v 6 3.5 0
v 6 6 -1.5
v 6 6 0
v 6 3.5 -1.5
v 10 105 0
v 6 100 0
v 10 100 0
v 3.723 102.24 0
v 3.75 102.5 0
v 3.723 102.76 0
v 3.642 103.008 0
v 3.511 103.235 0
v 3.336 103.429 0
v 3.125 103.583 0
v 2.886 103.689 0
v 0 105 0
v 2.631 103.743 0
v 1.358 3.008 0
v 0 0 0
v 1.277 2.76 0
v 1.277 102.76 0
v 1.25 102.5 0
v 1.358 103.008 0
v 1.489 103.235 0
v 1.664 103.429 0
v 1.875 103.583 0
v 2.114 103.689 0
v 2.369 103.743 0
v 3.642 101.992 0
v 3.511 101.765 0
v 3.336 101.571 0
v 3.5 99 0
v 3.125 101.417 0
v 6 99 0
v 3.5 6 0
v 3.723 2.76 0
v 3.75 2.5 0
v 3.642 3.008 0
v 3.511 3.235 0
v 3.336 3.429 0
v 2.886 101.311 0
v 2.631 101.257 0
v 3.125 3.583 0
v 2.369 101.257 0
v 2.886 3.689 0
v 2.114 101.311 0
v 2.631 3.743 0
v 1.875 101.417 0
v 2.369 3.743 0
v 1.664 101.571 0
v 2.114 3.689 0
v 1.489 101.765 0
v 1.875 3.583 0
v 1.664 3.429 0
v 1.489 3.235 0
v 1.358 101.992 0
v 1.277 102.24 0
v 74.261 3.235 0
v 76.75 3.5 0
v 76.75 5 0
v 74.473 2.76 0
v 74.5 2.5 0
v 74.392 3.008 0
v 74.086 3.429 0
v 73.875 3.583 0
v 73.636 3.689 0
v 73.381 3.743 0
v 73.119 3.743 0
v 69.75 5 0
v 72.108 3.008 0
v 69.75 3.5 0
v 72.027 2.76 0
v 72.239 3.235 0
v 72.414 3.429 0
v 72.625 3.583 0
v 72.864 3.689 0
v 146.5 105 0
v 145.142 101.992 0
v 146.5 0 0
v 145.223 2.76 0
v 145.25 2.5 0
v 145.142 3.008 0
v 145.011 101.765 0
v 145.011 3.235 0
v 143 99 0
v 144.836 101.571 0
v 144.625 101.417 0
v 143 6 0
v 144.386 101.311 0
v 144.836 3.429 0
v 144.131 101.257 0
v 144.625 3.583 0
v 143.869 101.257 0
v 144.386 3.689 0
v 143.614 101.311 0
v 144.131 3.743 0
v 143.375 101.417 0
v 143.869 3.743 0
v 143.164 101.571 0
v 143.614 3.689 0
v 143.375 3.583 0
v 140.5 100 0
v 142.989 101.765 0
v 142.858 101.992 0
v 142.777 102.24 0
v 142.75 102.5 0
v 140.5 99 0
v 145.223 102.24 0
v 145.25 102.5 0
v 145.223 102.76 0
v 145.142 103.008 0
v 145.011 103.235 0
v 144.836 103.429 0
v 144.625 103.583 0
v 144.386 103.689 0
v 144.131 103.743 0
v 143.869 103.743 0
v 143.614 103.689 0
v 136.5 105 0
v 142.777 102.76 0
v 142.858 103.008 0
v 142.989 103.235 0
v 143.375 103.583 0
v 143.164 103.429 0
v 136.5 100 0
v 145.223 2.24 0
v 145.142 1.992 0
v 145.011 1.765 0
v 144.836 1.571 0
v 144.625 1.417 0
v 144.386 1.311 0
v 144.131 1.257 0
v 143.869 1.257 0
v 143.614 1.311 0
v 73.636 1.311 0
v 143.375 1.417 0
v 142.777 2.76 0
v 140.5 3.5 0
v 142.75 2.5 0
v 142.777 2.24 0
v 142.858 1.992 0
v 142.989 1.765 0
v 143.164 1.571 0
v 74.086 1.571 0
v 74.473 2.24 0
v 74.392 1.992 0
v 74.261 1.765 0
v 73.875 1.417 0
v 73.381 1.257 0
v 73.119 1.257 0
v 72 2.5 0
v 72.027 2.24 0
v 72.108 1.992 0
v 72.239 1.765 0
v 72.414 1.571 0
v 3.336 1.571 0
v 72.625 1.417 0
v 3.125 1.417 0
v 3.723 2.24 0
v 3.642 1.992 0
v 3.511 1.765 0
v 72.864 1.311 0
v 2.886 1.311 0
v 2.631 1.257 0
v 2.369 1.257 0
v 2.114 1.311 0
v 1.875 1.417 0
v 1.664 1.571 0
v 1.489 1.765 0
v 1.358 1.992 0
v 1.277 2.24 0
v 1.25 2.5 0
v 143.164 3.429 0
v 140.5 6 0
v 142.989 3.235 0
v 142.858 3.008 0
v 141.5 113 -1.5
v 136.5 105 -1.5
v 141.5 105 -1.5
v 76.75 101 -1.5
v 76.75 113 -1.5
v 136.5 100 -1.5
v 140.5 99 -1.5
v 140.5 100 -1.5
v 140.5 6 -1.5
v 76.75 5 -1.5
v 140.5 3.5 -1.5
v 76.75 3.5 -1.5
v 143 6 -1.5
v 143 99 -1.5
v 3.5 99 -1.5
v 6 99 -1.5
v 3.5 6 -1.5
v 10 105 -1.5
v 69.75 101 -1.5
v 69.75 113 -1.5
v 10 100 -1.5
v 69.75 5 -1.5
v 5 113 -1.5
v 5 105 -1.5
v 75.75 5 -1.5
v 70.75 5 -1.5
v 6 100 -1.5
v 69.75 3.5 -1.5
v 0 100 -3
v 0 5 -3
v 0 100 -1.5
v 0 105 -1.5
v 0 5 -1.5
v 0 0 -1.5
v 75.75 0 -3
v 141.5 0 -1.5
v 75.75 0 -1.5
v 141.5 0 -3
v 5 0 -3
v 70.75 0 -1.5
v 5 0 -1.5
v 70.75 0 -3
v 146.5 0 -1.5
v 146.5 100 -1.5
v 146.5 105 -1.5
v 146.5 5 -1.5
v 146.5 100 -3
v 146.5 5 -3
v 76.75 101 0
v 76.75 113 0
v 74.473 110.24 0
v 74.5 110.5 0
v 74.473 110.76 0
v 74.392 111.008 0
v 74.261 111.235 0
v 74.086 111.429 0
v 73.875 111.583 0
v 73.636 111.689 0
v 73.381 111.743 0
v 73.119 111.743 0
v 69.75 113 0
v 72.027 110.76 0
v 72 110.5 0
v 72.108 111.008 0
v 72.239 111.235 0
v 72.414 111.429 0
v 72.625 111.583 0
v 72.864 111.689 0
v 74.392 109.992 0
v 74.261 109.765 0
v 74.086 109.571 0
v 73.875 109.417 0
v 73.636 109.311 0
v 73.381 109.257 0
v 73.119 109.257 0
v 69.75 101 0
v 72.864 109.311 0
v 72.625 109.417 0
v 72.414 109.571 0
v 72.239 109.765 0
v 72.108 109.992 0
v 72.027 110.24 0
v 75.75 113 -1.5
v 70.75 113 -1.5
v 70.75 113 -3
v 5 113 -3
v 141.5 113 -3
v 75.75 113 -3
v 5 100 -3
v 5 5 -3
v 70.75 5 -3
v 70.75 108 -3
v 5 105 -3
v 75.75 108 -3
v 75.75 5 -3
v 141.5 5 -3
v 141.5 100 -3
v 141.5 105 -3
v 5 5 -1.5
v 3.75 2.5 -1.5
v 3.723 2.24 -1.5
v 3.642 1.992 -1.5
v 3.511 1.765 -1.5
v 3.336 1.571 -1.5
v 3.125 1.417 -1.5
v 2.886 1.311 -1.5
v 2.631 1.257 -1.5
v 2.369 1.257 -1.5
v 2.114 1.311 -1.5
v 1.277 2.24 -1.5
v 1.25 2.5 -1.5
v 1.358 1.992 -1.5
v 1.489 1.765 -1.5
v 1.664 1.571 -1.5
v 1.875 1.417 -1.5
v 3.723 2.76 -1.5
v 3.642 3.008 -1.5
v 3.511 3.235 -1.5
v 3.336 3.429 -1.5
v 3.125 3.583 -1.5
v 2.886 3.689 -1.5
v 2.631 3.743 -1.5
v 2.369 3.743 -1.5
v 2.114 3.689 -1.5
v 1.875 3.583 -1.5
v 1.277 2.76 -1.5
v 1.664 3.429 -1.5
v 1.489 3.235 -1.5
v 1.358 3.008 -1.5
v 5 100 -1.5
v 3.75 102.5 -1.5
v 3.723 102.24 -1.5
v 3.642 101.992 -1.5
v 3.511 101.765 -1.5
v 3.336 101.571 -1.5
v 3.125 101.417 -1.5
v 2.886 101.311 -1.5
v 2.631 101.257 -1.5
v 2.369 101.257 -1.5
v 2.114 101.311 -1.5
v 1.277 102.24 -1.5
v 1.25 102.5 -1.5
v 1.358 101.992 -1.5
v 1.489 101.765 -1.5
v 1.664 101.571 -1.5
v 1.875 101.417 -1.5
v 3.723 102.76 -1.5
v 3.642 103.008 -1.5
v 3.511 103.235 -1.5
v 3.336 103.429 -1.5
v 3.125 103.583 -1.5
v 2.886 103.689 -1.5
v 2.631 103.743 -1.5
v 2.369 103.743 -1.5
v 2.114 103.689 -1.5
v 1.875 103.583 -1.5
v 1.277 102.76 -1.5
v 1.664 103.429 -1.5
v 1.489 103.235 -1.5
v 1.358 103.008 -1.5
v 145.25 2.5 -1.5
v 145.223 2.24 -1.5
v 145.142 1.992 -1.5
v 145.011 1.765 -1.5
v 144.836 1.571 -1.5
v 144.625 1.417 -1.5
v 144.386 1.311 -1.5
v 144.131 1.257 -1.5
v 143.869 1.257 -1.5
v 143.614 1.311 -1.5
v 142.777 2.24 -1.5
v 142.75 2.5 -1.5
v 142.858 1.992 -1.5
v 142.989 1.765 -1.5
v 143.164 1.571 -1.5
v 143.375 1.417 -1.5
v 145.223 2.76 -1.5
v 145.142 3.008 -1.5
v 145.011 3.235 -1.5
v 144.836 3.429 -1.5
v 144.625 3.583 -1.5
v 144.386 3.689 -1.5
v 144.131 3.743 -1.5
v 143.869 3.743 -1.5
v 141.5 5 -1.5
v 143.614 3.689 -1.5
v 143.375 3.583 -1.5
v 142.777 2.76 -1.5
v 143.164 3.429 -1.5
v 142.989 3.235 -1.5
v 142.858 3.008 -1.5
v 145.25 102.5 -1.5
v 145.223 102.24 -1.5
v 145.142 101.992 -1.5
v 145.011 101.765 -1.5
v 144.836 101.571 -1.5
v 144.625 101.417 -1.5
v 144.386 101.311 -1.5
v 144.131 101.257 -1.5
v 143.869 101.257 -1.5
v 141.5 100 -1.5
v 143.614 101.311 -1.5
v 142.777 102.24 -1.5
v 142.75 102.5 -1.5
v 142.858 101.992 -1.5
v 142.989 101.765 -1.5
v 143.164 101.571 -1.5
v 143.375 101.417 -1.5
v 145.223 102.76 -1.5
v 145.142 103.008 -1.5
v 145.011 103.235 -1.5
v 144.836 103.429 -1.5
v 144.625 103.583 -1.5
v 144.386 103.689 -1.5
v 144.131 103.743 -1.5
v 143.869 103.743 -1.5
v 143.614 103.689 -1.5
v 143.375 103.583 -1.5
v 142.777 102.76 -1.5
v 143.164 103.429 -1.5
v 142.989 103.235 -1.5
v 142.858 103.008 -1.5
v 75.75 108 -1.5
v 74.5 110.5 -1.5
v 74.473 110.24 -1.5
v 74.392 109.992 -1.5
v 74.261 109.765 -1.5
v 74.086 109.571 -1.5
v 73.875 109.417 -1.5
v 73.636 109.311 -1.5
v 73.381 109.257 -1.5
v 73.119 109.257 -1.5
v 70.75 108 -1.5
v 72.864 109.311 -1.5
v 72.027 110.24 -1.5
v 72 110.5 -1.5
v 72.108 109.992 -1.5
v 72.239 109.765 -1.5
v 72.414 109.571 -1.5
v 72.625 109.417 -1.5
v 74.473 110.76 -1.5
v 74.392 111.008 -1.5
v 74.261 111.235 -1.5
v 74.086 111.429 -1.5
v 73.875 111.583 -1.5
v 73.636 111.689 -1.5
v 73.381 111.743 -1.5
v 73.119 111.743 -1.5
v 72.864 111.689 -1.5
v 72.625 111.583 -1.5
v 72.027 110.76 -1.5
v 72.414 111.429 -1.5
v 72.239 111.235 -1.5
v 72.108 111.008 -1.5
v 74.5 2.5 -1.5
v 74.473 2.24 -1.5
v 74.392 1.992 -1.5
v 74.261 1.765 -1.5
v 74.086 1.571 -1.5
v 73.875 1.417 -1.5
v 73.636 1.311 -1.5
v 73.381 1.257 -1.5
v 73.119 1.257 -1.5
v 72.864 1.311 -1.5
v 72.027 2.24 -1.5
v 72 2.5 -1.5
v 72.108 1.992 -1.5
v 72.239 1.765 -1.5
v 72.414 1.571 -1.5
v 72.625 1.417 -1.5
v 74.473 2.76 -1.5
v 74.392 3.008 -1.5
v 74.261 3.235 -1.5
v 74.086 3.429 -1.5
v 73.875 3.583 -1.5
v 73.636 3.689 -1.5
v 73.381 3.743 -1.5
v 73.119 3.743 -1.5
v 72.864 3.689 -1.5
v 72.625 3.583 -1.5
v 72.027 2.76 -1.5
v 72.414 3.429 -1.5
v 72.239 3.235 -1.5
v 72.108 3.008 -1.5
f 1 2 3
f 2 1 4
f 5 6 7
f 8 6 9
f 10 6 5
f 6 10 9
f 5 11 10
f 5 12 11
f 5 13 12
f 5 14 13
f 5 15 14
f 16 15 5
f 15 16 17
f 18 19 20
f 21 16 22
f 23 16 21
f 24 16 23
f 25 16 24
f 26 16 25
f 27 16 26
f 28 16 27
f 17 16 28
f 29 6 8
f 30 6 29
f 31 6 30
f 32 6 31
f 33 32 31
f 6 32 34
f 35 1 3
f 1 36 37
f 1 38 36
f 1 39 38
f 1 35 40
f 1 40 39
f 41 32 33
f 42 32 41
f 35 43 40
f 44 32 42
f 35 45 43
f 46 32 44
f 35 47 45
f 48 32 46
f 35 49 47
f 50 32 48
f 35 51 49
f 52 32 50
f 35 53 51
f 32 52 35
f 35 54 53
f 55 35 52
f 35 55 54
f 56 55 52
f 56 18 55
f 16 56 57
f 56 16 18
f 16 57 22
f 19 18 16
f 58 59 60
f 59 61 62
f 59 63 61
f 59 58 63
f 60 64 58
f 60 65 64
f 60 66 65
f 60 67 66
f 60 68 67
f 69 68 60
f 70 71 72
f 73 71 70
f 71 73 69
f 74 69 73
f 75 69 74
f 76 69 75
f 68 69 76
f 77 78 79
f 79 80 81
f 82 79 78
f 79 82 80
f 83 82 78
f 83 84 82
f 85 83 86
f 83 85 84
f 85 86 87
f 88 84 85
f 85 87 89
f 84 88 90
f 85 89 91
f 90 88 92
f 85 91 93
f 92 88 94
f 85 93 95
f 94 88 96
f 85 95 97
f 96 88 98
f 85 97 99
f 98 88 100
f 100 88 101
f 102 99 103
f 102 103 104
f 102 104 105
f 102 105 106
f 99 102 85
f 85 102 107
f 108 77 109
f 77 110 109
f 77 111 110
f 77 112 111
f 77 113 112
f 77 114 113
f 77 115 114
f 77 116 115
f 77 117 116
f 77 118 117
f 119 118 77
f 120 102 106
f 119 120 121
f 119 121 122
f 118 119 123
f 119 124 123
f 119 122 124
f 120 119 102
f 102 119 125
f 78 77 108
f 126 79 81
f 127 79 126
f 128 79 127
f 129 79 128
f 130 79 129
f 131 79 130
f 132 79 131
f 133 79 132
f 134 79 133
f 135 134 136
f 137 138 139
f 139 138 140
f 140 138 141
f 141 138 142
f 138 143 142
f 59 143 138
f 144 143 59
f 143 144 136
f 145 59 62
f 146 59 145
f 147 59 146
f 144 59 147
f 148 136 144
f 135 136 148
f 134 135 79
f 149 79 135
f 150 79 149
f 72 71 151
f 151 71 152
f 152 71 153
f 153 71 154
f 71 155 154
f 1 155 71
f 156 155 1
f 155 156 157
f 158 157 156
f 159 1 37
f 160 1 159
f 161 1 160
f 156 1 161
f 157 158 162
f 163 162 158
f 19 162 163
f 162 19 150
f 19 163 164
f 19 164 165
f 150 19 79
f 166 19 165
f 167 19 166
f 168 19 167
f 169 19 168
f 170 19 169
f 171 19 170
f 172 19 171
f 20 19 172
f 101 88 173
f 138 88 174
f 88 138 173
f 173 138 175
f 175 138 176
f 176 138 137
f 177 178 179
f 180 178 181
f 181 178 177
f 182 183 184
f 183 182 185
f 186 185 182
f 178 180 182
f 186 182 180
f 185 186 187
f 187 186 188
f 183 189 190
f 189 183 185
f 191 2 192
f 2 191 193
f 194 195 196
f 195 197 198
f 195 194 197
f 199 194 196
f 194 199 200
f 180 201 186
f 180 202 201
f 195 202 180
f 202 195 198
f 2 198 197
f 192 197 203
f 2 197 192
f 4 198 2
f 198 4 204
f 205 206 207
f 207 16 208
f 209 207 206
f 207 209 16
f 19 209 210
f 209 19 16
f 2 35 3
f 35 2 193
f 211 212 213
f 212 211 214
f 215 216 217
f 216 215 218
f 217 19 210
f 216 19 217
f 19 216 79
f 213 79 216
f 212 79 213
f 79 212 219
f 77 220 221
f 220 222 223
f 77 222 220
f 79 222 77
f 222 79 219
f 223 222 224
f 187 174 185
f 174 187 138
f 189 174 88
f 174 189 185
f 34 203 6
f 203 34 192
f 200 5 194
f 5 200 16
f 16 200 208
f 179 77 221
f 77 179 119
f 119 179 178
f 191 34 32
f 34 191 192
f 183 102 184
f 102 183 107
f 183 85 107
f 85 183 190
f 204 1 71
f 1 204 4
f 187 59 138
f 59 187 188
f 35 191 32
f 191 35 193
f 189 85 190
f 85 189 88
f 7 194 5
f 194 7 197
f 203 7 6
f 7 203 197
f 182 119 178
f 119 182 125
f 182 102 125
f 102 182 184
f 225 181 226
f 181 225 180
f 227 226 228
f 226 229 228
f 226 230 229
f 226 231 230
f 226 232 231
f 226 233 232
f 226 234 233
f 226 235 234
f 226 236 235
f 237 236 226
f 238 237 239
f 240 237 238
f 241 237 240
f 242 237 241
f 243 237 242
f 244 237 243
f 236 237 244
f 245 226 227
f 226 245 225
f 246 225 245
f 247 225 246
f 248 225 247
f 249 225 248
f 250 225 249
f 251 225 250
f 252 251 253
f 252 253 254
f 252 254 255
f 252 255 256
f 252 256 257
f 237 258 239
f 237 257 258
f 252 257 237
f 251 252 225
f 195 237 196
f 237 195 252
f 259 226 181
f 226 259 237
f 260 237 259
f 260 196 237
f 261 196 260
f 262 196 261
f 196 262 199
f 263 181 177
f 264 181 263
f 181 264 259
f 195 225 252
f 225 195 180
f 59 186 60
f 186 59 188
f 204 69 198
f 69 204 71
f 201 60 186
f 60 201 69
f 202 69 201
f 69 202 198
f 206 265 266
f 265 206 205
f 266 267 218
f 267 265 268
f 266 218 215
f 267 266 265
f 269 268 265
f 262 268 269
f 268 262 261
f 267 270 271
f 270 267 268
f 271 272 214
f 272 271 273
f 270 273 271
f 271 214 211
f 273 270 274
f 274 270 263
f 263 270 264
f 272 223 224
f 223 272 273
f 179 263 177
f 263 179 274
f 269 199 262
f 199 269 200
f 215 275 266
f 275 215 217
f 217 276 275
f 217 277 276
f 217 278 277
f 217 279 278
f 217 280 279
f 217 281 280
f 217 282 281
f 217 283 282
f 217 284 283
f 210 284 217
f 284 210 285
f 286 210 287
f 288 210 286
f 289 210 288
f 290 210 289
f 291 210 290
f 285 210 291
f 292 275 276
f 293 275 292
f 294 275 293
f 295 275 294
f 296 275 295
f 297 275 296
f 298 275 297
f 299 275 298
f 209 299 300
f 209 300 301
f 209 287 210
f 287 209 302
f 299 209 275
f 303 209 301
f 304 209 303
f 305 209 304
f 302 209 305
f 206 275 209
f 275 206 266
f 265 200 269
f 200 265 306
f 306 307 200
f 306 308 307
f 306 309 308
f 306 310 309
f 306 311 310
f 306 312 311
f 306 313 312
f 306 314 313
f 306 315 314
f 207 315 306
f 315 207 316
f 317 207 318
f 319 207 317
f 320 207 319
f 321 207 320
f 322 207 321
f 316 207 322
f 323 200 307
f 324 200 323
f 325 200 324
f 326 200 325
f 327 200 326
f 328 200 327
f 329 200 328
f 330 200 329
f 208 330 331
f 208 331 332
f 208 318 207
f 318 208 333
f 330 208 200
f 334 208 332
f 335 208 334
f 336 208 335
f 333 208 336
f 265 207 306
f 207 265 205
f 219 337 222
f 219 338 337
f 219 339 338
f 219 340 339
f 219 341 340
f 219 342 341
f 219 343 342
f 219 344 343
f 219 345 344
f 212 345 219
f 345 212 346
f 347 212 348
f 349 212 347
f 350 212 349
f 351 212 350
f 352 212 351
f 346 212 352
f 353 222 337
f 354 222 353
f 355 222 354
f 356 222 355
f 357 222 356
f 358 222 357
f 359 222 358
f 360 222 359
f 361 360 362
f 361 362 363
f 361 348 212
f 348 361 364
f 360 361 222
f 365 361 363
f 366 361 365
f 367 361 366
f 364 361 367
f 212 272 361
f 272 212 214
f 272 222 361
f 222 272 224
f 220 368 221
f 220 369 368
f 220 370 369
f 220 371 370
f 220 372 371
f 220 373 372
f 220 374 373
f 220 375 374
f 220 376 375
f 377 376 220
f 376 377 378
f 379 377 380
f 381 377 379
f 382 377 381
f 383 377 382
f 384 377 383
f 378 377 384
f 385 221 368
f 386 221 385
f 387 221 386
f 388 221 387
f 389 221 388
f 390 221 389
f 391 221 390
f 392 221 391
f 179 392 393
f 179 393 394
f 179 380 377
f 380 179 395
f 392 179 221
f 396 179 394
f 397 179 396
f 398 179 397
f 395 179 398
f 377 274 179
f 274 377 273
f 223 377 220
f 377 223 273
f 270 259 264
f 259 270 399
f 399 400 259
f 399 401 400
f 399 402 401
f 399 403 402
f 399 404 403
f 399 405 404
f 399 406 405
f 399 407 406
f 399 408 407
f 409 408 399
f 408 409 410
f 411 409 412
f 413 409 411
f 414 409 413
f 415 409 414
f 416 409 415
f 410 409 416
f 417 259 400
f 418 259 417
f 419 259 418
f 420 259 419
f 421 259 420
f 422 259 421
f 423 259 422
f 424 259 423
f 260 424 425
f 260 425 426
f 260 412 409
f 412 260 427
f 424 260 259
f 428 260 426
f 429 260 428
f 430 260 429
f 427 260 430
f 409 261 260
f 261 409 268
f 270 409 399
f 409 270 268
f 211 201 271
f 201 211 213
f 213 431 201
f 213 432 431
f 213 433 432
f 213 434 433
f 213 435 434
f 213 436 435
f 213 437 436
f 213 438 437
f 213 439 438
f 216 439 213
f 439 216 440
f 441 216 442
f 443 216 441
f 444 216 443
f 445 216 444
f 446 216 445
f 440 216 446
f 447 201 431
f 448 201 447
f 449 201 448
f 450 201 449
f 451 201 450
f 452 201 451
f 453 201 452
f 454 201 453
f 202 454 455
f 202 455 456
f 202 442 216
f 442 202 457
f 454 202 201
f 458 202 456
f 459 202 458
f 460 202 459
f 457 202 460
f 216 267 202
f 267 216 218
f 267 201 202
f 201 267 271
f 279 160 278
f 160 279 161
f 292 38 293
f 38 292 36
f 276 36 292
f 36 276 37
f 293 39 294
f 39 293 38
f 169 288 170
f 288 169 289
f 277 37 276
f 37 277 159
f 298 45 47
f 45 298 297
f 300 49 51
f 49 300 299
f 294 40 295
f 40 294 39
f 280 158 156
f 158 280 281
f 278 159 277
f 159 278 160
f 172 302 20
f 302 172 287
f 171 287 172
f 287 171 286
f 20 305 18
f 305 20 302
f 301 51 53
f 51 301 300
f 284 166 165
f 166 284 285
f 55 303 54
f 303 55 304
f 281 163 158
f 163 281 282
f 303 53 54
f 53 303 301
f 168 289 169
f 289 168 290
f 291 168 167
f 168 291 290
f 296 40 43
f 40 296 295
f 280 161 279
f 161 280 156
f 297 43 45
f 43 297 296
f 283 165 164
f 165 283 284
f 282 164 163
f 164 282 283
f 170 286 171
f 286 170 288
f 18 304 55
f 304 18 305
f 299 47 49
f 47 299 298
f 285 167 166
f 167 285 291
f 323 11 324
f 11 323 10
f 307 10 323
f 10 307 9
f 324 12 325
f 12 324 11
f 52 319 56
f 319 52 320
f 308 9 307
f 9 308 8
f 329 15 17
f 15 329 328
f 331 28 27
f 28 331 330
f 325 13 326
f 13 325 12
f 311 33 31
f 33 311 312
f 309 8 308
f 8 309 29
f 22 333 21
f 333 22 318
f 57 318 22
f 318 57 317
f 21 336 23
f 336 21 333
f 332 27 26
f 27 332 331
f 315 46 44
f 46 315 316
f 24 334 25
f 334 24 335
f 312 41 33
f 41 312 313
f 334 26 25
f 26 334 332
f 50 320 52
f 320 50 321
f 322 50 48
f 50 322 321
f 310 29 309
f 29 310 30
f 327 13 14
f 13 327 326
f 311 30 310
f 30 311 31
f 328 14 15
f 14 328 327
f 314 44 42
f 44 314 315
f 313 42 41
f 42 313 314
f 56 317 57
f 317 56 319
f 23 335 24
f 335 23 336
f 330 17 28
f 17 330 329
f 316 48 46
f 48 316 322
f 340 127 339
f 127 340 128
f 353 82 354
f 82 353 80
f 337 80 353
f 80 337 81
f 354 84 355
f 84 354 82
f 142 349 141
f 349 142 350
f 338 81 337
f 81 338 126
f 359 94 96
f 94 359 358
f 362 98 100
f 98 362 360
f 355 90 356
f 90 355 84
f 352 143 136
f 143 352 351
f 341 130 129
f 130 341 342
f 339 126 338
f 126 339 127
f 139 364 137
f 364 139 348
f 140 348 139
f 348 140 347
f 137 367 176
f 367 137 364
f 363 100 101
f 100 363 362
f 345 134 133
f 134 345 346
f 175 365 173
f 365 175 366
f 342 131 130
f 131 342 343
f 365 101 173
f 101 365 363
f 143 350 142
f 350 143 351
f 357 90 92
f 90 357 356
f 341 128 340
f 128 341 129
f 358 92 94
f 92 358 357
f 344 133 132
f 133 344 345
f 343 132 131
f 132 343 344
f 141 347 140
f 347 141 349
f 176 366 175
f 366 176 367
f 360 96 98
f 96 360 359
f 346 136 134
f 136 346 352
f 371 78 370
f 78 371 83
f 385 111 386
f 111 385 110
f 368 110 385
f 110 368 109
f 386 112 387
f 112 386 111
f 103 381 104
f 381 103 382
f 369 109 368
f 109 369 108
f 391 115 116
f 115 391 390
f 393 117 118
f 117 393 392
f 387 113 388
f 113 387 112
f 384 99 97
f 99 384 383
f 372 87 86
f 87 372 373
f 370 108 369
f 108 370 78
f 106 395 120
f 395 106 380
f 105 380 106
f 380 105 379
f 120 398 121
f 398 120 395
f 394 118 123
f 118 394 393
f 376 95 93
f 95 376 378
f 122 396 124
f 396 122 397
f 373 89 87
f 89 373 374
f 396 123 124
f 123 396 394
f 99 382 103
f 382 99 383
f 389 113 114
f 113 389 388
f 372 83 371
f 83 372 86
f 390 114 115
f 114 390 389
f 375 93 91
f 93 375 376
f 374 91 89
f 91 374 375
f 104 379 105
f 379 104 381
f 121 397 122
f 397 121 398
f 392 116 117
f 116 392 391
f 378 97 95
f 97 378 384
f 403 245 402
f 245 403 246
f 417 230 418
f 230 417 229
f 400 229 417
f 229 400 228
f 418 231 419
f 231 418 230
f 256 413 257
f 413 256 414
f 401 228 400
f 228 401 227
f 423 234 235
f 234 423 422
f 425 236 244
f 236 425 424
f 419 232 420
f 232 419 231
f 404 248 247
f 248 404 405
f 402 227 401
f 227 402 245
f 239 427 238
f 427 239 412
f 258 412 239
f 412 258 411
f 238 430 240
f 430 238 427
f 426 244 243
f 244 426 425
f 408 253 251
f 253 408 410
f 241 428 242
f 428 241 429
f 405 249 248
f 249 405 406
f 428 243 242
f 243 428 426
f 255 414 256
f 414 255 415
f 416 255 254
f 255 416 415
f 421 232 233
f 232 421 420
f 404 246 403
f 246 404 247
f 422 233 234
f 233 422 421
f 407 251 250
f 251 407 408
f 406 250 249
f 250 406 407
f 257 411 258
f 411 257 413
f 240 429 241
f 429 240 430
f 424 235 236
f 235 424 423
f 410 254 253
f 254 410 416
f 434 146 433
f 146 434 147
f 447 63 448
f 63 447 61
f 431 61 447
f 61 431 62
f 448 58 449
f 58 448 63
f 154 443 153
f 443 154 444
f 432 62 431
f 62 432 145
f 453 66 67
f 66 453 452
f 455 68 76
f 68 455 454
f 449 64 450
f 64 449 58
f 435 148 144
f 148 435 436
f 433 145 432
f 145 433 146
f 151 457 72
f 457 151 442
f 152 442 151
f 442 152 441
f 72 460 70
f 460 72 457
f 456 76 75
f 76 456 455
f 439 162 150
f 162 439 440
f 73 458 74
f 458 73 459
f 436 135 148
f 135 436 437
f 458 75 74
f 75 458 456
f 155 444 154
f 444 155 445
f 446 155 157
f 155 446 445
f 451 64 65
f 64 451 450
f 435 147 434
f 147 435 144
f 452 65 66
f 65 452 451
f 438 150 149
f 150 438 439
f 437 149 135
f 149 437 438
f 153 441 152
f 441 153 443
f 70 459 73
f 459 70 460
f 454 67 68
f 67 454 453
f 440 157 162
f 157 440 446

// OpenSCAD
// file: key_definitions.scad
/*
 * Standard 1u keycap size
 *  Keycap placeholder space: 19.05 x 19.05mm
 *  Keycap size: 18 x 18mm
 *  Plate switch hole: 14 x 14mm
 *  Distance between switch holes: 5.05mm
 */

U1 = 18; /* Default */
U125 = U1 * 1.25; /* 22.5, Modifier */
U15 = U1 * 1.50;  /* 27.0, Modifier, Tab, '\|'' */
U175 = U1 * 1.75; /* 31.5, Caps Lock */
U2 = U1 * 2.00;   /* 36.0, Num Plus, Num Enter, Backspace */
U225 = U1 * 2.25; /* 40.5, Left Shift */
U275 = U1 * 2.75; /* 49.5, Right Shift */
U625 = U1 * 6.25; /* 112.5, Space */
// main file
include <key_definitions.scad>
use <key_support.scad>

$fn = 30;

KEYS_LEFT_1 = [
    [U1, U1, U1, U1, U1, U1, U1],
    [U15, U1, U1, U1, U1, U1],
    [U175, U1, U1, U1, U1, U1],
    [U225, U1, U1, U1, U1, U1],
    [U125, U125, U125, U125, U2]
];

KEYS_LEFT_old = [
    [U1, U1, U1, U1, U1, U1, U1],   /*   Esc 1 2 3 4 5 6 */
    [U125, U1, U1, U1, U1, U1],     /*   Tab  Q W E R T */
    [U175, U1, U1, U1, U1, U1],     /*   Ctrl  A S D F G */
    [U125, U1, U1, U1, U1, U1, U1], /*  Shift Caps Z X C V B */
    [U1, U125, U125, U1, U1, U15]   /*    Fn Opt Alt ? ? Space */
];

KEYS_LEFT_0124 = [
    [U1, U1, U1, U1, U1, U1, U1],   /* 7:  Esc 1 2 3 4 5 6 */
    [U15, U1, U1, U1, U1, U1],      /* 6:  Tab Q W E R T */
    [U175, U1, U1, U1, U1, U1],     /* 6:  Ctrl A S D F G */
    [-9, U175, U1, U1, U1, U1, U1], /* 6:  Shift Z X C V B */
    [U1, U125, U125, U1, U1, U175]  /* 6:  Fn Opt Alt Ml Mr Space */
];

KEYS = KEYS_LEFT_0124;

border = 5;
width = 136.5 + (border * 2);

DrawTopPlate = 0;
DrawKeyboard = 0;
DrawBottomPlate = 1;
DrawProto = 0;

if (DrawTopPlate) {
    translate([0, 0, 50])
        difference() {
            KeyboardTopPlate(border, width, KEYS);
            screwHole(border, width, KEYS,
                holeDepth = getTopPlateDepth(), cornerDepth = 3);
        }
}

if (DrawKeyboard) {
    translate([0, 0, 20])
        difference() {
            KeyboardBody(border, width, KEYS);
            screwHole(border, width, KEYS);
        }
}

if (DrawBottomPlate) {
    translate([0, 0, -getBottomPlateDepth()])
        difference() {
            KeyboardBottomPlate(border, width, KEYS);
            screwHole(border, width, KEYS,
                holeDepth = getBottomPlateDepth(),
                cornerDepth = getBottomPlateDepth()/2,
                screwPositionTop = false);
        }
}

if (DrawProto) {
    translate([0, 0, 5])
        difference() {
            KeyboardProto(border, width, KEYS);
            screwHole(border, width, KEYS);
        }
}
